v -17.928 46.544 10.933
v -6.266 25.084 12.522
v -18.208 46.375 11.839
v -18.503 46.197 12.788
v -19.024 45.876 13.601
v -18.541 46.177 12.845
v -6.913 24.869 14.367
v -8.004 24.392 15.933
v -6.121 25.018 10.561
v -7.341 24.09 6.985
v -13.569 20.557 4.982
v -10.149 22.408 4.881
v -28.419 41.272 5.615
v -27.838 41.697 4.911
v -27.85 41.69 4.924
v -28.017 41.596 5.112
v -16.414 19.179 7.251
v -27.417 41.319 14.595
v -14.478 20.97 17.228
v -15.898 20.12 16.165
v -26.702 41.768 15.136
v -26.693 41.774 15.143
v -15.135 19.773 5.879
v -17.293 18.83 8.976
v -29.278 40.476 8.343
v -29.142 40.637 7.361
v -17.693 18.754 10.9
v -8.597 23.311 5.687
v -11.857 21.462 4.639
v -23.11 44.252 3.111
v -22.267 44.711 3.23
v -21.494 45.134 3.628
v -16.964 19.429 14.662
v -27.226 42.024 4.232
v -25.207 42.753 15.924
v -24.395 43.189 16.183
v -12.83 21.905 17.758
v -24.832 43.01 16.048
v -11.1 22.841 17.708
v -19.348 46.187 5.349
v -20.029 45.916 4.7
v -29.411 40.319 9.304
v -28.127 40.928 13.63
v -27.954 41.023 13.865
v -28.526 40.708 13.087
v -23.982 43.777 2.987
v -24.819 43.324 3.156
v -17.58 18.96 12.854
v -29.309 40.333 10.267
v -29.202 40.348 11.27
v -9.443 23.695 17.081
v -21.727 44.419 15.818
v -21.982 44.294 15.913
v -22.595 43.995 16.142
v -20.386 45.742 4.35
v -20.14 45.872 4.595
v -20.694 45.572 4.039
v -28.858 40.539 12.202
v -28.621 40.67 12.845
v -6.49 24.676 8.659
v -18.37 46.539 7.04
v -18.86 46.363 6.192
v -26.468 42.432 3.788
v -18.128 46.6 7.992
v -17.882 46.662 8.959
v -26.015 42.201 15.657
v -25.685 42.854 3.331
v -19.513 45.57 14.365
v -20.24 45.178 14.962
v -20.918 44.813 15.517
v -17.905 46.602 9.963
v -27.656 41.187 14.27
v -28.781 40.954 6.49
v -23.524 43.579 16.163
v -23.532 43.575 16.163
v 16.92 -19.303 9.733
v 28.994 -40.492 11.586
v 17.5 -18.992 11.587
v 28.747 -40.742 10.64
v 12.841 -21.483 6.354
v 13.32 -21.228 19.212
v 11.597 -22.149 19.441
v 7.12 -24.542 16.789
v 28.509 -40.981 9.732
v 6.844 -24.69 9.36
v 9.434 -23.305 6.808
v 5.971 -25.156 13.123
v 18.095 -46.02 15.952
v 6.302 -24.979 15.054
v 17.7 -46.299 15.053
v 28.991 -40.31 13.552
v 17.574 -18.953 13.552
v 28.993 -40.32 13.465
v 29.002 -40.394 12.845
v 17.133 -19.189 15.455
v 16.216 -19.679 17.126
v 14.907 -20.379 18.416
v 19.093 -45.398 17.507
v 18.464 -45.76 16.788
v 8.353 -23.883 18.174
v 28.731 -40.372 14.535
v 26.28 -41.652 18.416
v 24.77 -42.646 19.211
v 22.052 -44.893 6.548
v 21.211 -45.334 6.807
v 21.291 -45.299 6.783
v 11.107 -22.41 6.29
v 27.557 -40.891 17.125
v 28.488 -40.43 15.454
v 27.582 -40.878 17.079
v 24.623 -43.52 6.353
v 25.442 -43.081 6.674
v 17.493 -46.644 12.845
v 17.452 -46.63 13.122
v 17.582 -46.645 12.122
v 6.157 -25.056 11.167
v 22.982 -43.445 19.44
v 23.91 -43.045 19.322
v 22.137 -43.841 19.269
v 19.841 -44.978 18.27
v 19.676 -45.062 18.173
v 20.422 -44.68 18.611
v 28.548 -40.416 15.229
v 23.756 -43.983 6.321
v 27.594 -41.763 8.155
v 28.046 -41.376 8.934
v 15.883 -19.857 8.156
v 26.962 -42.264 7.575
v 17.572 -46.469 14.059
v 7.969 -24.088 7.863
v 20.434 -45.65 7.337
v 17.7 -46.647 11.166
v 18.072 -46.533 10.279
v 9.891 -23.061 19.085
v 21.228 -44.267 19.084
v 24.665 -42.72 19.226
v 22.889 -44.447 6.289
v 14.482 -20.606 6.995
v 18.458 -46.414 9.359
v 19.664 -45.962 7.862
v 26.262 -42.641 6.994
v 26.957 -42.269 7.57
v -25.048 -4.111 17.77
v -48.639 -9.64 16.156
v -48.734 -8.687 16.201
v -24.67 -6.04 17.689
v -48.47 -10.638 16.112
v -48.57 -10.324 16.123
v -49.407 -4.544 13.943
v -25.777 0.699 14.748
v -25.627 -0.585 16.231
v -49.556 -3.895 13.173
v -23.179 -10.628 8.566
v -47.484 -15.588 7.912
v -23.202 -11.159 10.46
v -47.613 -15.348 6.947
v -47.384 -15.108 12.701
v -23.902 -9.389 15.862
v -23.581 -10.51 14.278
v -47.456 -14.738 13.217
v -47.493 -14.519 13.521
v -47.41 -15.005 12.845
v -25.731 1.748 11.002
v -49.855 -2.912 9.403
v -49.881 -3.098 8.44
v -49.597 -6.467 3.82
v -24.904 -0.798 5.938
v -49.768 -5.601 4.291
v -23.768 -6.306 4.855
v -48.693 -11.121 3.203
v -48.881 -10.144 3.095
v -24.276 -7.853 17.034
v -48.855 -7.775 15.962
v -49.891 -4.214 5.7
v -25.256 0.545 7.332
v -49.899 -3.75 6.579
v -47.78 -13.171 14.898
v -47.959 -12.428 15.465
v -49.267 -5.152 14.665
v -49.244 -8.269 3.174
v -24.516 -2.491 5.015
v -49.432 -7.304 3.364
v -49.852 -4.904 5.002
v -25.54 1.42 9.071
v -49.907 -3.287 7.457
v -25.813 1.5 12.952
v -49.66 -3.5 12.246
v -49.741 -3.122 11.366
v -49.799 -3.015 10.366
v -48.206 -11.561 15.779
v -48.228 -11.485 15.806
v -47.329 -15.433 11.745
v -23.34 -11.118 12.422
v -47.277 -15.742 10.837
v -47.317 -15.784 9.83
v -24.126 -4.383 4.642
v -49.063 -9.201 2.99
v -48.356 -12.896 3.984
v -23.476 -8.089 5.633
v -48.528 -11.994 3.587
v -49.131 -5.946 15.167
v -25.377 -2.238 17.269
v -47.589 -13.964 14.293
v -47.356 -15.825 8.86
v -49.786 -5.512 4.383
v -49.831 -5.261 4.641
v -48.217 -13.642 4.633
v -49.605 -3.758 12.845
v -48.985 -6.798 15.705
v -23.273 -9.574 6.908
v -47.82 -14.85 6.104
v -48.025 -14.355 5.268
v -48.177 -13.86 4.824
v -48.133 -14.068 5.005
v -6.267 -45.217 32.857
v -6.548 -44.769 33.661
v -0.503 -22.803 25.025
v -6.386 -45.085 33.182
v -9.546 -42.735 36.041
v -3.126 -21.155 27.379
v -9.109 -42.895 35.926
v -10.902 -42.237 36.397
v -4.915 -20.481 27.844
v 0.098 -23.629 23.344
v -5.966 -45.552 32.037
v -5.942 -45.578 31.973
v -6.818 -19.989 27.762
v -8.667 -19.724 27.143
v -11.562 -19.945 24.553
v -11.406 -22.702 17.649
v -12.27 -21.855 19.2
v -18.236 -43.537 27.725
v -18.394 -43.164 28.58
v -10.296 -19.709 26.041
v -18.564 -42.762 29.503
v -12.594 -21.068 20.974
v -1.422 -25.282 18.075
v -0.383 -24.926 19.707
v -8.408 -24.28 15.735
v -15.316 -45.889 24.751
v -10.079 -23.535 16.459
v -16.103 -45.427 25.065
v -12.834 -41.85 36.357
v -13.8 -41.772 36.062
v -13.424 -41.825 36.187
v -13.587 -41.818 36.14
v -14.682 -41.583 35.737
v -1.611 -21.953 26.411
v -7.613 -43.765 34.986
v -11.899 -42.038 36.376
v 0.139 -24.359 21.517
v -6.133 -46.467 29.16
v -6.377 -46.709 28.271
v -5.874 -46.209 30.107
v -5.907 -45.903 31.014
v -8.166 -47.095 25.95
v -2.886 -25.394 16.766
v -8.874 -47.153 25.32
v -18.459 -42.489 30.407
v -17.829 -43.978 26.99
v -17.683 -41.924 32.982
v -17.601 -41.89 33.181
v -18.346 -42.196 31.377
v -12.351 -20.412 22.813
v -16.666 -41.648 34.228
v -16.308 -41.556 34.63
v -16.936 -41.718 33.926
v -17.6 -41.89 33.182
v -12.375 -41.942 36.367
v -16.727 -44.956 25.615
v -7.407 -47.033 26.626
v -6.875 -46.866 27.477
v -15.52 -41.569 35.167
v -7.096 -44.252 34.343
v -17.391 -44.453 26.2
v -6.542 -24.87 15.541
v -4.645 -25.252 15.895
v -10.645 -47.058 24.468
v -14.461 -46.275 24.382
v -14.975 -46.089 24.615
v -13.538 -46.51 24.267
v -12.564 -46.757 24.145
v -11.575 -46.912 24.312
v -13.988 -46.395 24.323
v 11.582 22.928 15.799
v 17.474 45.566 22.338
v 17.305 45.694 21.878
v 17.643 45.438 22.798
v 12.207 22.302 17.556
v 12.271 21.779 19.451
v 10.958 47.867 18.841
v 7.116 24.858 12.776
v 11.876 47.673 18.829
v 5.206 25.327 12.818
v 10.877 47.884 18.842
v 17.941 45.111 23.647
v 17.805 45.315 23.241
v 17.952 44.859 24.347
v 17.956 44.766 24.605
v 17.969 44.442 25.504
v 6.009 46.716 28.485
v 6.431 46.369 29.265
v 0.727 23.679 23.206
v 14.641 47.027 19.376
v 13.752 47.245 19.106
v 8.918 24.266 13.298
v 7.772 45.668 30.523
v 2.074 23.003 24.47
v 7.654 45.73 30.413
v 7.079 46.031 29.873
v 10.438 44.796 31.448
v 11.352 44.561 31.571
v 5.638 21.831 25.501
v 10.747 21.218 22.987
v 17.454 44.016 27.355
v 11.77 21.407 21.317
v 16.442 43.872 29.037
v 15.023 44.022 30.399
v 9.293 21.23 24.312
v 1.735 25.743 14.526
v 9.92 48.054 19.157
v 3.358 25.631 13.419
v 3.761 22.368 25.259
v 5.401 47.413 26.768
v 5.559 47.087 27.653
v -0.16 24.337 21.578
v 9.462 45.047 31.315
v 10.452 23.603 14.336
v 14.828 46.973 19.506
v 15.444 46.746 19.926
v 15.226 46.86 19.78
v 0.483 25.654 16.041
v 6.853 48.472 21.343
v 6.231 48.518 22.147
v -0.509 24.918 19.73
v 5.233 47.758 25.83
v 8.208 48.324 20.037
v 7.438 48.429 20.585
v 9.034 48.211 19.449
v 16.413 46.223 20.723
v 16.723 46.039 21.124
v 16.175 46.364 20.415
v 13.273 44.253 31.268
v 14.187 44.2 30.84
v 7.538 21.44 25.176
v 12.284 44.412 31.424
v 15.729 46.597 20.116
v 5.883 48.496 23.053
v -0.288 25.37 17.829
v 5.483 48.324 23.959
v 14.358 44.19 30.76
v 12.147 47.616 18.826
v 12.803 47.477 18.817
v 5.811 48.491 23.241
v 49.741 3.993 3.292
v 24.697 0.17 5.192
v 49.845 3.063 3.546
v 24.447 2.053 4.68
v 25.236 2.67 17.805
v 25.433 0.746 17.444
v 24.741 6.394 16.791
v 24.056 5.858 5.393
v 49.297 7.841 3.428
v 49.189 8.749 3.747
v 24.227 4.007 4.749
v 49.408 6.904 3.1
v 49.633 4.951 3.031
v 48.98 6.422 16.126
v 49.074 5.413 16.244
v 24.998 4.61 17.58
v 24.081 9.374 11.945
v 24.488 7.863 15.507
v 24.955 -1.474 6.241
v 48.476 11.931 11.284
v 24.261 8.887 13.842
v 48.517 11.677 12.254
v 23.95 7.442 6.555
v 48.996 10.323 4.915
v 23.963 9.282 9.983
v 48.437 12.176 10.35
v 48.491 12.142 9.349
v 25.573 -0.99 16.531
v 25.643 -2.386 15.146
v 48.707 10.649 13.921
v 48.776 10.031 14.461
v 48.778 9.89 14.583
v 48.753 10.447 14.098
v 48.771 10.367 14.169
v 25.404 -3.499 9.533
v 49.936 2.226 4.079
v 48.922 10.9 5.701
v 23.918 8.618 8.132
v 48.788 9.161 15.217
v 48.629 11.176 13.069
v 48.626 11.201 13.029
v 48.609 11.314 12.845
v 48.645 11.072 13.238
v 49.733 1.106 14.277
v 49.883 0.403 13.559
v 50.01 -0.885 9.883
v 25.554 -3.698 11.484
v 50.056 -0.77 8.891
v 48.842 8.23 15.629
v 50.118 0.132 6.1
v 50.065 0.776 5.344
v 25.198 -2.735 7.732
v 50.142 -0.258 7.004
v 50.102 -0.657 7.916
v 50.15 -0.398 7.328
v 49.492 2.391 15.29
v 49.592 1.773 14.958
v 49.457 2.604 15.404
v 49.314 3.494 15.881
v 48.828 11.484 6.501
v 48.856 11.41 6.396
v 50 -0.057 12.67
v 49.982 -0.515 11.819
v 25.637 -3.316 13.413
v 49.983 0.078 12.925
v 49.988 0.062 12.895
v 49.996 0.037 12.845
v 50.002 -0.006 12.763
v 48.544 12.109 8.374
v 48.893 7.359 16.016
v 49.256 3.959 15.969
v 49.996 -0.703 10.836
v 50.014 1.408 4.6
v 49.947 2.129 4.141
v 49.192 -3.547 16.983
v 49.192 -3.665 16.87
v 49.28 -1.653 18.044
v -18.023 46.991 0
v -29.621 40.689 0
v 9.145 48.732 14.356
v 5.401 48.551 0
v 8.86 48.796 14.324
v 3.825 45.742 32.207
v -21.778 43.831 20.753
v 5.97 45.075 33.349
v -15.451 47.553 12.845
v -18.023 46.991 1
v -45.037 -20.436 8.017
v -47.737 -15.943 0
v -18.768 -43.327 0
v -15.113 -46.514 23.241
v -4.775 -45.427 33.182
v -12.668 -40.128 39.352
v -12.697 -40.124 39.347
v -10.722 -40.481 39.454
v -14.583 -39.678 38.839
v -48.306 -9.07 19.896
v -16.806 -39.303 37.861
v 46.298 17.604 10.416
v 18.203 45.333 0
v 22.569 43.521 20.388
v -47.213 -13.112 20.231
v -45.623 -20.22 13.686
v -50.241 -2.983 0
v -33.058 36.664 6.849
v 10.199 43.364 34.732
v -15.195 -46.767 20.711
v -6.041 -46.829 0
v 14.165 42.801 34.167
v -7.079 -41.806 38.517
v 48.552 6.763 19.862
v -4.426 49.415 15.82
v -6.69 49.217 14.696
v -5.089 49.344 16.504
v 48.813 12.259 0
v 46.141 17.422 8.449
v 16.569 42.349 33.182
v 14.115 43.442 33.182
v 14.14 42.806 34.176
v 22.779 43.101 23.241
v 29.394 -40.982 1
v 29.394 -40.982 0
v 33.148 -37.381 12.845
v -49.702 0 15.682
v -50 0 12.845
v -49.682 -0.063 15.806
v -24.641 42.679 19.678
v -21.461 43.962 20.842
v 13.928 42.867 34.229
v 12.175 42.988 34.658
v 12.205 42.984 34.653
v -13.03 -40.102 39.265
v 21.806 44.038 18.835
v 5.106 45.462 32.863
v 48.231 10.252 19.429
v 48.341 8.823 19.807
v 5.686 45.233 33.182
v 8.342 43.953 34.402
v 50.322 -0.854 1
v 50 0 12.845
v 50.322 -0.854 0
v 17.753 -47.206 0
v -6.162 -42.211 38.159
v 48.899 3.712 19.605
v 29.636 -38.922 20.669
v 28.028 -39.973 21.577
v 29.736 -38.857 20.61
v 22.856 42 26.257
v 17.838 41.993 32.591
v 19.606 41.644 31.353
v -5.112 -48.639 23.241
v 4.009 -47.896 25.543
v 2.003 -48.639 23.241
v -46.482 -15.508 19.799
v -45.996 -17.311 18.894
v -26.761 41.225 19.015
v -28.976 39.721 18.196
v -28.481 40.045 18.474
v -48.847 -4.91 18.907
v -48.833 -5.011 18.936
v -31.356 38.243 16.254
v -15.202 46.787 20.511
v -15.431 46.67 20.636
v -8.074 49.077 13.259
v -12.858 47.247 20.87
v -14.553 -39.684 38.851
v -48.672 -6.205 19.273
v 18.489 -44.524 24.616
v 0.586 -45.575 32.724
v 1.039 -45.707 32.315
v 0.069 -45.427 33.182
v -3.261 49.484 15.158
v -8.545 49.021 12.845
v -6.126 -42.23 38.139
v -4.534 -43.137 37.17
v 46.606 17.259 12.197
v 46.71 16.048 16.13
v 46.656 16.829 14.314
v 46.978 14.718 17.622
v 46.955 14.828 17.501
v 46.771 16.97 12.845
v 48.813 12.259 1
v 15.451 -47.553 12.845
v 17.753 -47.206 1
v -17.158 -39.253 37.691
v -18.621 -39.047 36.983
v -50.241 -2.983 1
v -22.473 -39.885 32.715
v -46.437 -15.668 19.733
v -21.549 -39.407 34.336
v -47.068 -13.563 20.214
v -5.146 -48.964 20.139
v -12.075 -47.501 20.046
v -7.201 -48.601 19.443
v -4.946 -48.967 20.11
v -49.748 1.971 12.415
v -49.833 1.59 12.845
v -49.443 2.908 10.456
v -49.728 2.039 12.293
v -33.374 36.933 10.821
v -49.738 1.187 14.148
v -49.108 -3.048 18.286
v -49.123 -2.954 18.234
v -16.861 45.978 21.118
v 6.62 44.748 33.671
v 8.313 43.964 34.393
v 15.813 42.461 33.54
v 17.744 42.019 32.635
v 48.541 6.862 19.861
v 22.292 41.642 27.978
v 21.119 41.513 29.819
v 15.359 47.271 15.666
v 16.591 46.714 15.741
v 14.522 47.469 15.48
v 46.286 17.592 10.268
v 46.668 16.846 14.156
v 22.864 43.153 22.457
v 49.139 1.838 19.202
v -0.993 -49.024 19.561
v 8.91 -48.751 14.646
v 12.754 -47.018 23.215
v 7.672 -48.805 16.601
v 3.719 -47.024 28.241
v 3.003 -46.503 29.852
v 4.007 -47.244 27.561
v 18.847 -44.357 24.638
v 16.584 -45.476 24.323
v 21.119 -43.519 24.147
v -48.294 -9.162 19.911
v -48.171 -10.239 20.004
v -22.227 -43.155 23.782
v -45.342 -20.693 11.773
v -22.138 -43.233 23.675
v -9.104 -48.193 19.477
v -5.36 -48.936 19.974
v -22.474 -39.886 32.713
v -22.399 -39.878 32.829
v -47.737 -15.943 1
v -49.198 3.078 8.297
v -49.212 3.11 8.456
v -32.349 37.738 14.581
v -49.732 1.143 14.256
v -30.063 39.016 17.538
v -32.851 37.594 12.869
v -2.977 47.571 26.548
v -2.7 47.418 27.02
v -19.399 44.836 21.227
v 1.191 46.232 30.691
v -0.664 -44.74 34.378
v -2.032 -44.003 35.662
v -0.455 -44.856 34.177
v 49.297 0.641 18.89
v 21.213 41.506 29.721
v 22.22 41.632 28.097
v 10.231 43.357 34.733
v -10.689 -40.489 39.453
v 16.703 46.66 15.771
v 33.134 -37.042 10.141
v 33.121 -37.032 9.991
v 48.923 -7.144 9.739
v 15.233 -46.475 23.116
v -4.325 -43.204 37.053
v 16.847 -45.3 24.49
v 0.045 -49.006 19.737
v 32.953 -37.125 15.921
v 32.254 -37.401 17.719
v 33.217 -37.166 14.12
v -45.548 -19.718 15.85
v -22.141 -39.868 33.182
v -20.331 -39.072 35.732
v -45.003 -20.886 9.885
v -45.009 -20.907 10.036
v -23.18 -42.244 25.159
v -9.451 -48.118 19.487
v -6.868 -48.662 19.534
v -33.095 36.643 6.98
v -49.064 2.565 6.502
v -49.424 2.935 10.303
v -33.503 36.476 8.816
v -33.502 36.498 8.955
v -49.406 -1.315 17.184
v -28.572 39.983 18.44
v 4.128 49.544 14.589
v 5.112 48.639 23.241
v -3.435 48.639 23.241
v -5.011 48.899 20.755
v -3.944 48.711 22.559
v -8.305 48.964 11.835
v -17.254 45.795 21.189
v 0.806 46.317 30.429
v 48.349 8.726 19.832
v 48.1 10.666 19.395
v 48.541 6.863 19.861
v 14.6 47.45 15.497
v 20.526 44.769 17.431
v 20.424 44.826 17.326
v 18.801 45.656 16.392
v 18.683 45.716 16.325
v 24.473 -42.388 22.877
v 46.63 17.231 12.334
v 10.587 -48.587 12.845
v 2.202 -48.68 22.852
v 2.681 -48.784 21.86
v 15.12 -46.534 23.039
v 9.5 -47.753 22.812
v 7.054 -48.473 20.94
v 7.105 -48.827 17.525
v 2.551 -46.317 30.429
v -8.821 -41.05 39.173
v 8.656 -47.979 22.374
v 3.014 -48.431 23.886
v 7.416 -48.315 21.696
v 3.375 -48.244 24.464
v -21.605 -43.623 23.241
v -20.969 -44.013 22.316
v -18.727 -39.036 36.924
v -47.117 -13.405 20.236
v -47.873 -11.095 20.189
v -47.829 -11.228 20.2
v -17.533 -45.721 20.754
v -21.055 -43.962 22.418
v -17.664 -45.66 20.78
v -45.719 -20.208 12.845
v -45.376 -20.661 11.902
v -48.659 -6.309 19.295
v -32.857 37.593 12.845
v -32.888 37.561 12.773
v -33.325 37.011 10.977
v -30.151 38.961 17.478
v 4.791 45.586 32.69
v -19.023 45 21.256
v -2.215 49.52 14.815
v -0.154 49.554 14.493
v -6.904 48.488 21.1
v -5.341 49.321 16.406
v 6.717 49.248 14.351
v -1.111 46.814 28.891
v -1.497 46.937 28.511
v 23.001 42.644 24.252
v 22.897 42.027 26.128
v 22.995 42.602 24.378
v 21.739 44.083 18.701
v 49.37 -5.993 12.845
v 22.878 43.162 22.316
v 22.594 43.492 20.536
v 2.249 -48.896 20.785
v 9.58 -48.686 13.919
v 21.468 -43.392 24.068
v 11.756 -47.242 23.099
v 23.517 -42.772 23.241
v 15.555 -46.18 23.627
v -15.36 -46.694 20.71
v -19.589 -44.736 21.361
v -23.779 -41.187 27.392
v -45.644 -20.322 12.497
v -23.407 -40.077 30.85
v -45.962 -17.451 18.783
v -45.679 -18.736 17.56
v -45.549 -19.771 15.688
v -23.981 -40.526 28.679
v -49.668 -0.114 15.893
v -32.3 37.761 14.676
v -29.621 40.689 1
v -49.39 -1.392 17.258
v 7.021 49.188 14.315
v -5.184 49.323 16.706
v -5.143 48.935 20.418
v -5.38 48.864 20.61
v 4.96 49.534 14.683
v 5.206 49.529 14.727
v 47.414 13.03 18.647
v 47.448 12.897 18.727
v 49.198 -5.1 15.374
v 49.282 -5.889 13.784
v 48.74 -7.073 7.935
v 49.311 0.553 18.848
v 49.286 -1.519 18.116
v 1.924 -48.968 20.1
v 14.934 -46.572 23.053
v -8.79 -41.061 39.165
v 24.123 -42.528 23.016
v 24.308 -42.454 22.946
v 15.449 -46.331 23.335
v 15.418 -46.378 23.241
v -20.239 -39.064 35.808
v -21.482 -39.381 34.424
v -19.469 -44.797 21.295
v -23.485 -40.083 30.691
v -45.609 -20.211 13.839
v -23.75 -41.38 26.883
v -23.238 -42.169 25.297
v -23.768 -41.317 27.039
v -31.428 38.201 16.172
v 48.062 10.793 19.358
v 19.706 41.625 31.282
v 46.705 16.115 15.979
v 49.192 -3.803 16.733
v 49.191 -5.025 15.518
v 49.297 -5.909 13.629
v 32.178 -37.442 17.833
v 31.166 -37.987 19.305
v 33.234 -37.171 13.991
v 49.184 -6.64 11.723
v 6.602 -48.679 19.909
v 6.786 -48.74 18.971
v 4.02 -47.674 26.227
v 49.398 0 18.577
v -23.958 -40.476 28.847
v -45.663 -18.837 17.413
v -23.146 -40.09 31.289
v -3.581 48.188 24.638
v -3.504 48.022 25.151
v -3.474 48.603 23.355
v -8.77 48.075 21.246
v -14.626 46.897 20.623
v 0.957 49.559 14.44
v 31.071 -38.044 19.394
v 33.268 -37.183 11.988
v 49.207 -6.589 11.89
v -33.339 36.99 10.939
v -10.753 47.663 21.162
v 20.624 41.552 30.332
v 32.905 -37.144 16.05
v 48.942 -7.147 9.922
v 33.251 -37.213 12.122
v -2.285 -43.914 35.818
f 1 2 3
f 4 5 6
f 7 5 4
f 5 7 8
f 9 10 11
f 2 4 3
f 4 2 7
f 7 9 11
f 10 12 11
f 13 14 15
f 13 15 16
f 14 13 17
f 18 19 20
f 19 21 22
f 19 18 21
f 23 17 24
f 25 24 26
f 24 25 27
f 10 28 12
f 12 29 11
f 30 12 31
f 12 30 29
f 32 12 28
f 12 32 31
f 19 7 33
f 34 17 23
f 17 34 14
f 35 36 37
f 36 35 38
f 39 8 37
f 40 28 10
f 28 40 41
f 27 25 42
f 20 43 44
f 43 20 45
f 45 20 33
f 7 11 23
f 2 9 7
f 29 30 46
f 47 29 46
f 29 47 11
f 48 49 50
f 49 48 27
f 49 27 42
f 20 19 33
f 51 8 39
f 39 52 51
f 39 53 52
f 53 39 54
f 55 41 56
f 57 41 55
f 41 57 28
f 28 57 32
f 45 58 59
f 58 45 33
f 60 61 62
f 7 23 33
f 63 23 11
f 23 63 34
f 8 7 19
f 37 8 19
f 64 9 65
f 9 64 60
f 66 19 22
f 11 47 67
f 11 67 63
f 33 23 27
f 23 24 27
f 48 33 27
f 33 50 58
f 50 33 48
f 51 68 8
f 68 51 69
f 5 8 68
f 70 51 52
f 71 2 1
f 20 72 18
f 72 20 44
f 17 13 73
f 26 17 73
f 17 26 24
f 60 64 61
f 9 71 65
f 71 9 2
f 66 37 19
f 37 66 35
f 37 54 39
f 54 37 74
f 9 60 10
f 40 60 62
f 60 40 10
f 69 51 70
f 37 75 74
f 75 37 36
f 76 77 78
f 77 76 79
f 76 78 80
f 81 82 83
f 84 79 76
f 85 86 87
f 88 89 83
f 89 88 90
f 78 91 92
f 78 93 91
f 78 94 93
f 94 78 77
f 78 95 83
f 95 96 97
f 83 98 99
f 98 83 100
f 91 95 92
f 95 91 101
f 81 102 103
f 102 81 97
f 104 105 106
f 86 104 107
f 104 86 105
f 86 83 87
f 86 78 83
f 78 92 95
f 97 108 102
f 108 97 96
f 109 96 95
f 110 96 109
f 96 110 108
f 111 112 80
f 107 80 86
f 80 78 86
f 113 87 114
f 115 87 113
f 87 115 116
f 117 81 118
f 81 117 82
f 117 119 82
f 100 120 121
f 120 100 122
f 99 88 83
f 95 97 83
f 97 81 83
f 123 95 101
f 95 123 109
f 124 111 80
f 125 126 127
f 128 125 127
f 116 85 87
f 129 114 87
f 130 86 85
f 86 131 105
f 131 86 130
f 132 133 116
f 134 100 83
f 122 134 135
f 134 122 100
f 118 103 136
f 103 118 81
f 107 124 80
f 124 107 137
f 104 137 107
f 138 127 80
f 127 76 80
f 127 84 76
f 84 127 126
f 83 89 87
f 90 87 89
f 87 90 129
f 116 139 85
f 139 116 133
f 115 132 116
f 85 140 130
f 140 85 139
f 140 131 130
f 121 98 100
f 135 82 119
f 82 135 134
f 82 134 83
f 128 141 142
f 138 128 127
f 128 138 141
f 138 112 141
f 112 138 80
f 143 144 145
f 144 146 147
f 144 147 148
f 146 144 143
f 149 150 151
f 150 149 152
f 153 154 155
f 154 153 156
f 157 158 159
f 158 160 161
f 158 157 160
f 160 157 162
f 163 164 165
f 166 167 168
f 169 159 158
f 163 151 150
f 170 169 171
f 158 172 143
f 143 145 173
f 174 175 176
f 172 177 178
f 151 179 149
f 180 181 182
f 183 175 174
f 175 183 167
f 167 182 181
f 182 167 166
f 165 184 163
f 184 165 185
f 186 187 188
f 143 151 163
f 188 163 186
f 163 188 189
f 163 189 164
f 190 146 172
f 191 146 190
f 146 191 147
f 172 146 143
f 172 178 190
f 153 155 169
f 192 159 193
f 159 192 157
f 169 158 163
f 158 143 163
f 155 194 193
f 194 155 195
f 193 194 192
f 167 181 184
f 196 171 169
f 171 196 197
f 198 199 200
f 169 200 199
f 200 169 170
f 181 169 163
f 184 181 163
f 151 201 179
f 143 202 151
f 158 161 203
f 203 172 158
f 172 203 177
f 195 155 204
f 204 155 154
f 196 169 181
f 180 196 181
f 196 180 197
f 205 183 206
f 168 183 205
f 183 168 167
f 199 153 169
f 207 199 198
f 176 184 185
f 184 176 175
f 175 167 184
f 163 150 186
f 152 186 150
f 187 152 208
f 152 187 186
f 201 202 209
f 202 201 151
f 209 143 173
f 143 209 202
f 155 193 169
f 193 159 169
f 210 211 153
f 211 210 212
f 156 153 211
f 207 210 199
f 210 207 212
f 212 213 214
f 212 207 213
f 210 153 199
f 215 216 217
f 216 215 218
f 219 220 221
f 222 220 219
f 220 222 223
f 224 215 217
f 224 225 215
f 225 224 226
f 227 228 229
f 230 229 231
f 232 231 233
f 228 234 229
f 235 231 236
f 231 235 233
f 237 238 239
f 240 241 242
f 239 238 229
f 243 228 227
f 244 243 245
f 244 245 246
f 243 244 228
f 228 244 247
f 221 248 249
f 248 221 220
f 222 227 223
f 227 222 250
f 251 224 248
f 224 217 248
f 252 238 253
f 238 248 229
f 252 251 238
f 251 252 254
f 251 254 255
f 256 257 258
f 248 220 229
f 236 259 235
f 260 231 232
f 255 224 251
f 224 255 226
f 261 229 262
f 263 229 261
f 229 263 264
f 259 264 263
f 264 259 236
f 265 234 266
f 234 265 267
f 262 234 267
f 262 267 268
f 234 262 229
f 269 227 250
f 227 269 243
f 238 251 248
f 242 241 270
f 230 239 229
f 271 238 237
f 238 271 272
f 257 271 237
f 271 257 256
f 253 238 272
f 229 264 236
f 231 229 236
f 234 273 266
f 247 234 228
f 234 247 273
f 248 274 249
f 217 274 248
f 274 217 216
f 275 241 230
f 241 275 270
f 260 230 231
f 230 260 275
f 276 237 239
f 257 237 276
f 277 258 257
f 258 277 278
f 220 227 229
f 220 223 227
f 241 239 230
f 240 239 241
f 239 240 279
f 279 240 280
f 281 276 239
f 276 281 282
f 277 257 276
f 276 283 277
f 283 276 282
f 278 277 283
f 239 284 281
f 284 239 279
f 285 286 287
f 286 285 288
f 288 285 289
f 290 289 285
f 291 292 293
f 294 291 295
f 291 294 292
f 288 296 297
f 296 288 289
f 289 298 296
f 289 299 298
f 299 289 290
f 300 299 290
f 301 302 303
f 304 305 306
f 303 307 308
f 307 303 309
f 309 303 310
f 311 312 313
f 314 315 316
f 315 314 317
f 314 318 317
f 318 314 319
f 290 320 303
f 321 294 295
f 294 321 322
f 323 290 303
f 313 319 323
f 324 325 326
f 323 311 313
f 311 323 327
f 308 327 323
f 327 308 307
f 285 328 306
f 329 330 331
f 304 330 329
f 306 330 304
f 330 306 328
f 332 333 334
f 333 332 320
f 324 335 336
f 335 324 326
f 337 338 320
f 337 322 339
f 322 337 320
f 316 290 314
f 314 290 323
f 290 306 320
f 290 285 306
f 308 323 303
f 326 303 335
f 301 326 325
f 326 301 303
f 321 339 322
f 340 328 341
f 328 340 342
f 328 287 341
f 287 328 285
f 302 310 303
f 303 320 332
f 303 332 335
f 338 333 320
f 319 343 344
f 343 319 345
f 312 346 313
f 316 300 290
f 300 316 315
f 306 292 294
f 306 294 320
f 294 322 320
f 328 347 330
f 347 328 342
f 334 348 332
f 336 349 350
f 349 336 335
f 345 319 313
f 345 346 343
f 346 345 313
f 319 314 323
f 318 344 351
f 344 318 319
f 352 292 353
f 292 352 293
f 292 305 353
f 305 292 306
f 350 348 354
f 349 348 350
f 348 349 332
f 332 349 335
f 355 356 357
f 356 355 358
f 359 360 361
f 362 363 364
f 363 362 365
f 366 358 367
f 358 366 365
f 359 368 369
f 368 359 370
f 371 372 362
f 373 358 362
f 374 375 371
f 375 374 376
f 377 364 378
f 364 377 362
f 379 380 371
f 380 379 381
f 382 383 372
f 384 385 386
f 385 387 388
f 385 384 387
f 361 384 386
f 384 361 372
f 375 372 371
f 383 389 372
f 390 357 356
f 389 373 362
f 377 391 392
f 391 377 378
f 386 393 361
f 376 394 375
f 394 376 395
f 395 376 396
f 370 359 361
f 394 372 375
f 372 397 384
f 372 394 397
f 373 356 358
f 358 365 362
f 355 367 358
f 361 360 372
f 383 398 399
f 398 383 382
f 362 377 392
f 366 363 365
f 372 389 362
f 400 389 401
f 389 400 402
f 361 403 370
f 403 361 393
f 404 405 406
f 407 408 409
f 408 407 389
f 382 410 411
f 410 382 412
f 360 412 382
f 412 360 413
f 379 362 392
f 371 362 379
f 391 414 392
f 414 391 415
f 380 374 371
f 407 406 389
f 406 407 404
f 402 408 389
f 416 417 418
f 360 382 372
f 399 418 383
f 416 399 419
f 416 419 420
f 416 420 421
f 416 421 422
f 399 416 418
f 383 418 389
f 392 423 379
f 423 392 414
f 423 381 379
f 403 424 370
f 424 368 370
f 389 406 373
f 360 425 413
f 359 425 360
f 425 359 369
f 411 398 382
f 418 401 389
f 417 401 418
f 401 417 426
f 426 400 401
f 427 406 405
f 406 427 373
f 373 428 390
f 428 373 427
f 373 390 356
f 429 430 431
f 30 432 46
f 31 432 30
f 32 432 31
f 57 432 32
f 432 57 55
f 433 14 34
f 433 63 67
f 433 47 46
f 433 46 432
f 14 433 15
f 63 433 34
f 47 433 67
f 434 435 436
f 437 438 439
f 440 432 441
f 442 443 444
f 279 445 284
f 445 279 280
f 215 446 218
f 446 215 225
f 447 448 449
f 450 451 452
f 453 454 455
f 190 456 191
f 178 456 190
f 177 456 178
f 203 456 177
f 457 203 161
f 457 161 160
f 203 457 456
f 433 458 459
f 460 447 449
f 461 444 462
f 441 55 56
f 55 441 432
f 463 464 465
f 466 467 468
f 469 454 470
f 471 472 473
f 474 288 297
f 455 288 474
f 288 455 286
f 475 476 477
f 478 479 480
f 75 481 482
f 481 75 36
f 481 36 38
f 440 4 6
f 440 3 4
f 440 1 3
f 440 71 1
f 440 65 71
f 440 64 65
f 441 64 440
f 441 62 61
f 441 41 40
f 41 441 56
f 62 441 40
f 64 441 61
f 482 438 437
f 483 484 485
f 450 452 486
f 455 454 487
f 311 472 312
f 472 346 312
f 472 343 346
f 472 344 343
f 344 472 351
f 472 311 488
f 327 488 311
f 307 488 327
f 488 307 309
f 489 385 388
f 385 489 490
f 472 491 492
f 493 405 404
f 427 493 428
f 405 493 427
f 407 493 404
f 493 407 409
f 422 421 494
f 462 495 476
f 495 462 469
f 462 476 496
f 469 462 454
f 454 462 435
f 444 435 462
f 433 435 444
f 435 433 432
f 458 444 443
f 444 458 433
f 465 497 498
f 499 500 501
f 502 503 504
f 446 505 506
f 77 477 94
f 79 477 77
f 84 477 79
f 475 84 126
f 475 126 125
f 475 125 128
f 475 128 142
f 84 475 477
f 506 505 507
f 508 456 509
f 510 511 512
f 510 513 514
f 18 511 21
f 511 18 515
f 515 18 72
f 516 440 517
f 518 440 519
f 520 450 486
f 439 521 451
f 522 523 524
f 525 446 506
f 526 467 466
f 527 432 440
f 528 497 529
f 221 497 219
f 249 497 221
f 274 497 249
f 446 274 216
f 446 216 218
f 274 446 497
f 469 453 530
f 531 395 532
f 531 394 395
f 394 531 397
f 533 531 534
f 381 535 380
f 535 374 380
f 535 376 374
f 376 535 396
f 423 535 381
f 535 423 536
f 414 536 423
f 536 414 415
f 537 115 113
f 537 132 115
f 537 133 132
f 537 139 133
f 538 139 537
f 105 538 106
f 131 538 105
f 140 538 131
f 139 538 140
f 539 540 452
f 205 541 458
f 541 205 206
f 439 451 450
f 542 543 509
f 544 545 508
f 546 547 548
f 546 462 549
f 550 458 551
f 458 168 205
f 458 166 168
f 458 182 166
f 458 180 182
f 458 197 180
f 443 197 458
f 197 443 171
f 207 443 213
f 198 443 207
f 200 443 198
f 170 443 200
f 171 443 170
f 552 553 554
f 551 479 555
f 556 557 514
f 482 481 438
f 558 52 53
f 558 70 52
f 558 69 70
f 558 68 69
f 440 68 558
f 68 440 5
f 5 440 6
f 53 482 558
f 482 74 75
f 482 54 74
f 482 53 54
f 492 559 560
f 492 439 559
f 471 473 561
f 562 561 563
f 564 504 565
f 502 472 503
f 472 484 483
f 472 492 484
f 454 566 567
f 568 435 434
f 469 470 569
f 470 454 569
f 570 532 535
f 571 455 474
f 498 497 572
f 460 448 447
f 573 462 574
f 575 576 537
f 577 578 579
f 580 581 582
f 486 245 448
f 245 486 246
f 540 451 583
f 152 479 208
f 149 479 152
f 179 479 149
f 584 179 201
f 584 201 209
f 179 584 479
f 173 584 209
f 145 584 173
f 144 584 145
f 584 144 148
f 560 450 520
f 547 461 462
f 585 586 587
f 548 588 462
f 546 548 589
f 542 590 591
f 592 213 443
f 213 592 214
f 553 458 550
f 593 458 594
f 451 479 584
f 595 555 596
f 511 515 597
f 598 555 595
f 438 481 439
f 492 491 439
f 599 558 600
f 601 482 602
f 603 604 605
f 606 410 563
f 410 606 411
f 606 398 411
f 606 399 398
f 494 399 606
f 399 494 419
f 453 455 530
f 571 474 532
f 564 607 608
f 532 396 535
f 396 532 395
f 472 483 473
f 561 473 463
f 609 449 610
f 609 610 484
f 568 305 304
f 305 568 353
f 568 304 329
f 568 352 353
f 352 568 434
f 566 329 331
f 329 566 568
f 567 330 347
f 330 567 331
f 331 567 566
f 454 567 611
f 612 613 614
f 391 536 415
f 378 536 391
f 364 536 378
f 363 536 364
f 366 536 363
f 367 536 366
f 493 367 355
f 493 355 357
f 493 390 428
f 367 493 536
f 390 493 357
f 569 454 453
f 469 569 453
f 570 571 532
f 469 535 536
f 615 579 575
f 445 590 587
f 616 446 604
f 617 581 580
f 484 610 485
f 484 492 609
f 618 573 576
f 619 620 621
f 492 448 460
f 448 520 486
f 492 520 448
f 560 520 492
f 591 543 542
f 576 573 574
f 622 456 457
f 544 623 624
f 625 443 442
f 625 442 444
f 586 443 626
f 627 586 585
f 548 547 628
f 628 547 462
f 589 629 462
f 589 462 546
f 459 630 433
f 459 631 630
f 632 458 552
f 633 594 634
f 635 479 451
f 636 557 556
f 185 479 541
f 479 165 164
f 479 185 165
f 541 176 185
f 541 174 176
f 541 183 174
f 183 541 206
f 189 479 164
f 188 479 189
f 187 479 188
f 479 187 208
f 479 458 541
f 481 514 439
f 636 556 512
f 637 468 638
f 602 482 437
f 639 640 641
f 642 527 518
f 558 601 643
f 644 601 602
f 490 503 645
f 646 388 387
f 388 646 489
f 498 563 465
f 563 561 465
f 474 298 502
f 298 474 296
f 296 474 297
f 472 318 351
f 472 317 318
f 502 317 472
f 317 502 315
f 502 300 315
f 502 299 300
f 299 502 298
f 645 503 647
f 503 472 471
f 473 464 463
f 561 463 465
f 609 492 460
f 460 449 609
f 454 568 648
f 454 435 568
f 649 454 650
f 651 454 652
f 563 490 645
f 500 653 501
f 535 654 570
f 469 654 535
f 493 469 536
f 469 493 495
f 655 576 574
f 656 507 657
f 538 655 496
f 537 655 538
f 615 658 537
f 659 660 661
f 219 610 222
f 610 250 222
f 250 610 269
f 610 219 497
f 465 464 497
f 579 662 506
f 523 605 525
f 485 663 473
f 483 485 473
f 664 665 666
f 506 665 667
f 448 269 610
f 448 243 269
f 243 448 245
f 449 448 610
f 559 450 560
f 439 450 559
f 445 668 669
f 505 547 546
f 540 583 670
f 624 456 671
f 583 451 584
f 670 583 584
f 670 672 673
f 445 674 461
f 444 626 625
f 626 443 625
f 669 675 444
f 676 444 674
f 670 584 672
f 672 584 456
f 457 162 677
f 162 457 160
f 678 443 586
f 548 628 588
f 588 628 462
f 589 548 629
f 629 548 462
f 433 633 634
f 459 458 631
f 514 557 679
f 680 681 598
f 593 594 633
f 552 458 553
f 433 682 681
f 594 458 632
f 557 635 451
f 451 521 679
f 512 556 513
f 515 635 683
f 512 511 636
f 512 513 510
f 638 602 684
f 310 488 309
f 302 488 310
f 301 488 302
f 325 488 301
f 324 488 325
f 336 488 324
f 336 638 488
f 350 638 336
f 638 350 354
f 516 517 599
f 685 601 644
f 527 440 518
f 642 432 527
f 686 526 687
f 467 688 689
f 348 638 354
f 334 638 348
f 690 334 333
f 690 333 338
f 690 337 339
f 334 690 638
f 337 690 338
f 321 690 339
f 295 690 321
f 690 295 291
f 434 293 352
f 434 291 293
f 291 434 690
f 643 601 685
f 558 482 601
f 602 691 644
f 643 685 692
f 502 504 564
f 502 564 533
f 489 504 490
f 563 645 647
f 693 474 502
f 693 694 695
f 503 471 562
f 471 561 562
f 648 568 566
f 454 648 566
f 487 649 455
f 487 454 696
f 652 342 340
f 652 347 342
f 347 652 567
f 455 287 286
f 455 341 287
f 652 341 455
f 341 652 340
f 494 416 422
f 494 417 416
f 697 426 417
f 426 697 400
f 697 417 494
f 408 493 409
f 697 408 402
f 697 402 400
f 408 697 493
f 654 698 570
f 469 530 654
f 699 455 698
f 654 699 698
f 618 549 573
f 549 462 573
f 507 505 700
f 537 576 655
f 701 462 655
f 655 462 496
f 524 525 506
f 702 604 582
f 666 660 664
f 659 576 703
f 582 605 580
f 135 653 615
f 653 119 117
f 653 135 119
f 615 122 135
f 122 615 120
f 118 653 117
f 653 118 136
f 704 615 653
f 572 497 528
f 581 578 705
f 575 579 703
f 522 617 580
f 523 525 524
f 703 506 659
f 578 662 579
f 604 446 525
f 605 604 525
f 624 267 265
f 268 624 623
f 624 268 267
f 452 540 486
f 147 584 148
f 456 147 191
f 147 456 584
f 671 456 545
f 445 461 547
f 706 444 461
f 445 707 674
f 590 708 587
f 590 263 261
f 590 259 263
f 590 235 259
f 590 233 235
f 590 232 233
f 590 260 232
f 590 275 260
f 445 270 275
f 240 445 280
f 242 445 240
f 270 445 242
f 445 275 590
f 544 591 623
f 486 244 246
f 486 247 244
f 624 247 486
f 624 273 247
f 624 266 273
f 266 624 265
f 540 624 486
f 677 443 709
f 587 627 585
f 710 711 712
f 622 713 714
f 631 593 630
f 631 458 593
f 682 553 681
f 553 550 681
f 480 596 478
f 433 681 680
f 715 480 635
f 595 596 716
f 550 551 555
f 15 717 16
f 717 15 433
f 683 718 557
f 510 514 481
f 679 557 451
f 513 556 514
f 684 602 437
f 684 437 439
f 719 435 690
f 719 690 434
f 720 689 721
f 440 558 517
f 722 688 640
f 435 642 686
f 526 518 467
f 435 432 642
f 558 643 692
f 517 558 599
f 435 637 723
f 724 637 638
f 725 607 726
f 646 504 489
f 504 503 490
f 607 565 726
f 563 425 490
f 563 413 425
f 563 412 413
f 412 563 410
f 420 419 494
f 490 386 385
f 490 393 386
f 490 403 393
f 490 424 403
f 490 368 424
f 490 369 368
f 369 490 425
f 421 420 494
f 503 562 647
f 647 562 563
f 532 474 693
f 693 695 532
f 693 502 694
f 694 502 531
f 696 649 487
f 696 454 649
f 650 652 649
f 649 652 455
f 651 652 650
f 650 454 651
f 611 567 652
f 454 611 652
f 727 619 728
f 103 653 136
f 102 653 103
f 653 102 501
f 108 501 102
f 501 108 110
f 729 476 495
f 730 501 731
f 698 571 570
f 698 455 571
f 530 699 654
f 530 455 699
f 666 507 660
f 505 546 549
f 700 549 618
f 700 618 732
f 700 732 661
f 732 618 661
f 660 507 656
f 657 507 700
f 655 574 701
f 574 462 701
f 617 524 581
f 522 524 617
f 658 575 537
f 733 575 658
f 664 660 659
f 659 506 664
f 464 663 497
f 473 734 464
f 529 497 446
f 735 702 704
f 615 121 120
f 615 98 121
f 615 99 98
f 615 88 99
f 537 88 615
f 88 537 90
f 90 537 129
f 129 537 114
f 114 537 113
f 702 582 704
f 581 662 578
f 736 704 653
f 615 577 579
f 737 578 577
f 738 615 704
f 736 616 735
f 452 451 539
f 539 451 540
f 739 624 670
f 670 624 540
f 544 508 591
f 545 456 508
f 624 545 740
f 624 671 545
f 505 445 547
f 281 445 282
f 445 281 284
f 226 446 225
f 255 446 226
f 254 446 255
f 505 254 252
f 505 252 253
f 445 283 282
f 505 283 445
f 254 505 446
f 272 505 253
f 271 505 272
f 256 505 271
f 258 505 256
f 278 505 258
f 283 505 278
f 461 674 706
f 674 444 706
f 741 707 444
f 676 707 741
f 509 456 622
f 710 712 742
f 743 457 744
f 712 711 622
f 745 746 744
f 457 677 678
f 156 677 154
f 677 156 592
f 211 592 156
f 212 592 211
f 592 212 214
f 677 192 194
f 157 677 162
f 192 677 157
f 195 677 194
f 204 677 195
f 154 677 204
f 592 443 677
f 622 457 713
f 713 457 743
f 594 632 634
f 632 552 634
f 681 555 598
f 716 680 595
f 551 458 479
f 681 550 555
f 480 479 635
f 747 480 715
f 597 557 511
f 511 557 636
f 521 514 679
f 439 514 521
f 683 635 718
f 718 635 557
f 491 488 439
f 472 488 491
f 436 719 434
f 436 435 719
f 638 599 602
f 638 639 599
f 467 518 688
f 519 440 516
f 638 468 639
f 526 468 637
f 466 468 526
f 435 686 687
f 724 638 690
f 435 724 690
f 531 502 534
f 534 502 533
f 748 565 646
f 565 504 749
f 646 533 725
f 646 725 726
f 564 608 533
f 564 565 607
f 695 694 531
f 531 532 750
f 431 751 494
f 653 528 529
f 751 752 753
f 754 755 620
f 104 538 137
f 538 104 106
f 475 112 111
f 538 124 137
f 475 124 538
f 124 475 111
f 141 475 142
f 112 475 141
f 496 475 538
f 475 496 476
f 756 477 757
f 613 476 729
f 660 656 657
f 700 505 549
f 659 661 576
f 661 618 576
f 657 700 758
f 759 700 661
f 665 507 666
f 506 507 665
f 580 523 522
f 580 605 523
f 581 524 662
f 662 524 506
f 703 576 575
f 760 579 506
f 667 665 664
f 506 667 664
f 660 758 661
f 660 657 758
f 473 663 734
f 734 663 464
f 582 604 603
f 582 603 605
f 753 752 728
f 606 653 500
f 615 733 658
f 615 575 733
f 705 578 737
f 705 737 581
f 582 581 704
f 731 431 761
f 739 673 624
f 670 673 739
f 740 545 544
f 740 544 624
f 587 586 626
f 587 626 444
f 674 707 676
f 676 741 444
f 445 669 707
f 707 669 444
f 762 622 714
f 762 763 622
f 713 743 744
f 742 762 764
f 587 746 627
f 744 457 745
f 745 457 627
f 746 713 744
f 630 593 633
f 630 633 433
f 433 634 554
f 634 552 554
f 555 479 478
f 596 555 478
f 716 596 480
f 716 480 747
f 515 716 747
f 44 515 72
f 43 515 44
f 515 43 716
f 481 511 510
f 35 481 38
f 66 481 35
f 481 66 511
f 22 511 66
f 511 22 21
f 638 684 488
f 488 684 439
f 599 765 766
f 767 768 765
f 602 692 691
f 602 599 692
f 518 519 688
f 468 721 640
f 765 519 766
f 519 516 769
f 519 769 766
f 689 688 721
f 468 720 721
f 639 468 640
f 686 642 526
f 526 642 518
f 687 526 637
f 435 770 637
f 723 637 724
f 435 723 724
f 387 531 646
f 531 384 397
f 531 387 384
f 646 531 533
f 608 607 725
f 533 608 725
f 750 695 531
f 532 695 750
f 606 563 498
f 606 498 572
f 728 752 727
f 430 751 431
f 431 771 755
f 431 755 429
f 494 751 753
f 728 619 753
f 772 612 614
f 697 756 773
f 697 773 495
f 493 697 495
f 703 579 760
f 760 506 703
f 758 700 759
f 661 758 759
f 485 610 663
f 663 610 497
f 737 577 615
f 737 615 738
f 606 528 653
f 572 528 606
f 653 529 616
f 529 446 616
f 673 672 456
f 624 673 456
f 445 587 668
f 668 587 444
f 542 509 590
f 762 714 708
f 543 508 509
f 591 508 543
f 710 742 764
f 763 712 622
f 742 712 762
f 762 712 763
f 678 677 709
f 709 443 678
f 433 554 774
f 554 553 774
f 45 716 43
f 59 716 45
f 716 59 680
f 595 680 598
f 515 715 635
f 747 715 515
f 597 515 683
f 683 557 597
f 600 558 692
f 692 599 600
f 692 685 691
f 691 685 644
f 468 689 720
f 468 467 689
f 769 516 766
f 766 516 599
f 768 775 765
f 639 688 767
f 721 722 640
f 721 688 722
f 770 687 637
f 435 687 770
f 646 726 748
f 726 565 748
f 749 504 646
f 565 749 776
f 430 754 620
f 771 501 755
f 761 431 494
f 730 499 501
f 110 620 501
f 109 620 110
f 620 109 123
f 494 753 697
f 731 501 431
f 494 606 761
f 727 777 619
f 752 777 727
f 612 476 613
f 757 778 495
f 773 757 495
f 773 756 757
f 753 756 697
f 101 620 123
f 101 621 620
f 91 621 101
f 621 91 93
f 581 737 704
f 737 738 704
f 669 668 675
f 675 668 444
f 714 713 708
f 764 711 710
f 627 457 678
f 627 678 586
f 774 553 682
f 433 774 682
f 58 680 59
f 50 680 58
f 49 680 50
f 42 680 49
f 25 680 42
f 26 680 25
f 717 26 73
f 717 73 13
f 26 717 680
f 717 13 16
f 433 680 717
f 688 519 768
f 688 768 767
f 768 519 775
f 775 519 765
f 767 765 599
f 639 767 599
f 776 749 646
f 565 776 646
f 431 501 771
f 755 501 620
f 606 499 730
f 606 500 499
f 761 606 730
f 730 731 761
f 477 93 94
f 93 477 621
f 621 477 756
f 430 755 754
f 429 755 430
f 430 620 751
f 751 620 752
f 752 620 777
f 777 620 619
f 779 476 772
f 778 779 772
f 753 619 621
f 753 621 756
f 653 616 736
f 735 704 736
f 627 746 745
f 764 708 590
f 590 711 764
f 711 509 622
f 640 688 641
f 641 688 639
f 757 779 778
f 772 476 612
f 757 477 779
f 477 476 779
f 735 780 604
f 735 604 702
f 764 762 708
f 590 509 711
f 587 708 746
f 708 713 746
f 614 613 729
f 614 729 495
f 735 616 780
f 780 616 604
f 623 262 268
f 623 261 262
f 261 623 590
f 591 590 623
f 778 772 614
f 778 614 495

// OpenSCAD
difference() {
	hull() {
		union() {
			union() {
				rotate(a = 118.5190809644, v = [0, 0, 1]) {
					translate(v = [0, -6.6000000000, 0]) {
						cube(size = [49.8945602892, 13.2000000000, 1]);
					}
				}
				rotate(a = -61.8702837395, v = [0, 0, 1]) {
					translate(v = [0, -6.6000000000, 0]) {
						cube(size = [49.9999999791, 13.2000000000, 1]);
					}
				}
				rotate(a = -169.0667888368, v = [0, 0, 1]) {
					translate(v = [0, -6.6000000000, 0]) {
						cube(size = [49.8945597788, 13.2000000000, 1]);
					}
				}
				rotate(a = -105.3856022510, v = [0, 0, 1]) {
					translate(v = [0, -6.6000000000, 0]) {
						cube(size = [46.7539184115, 13.2000000000, 1]);
					}
				}
				rotate(a = 75.8877702221, v = [0, 0, 1]) {
					translate(v = [0, -6.6000000000, 0]) {
						cube(size = [48.4029110626, 13.2000000000, 1]);
					}
				}
				rotate(a = 6.5627499058, v = [0, 0, 1]) {
					translate(v = [0, -6.6000000000, 0]) {
						cube(size = [49.8945605185, 13.2000000000, 1]);
					}
				}
			}
			translate(v = [0, 0, 12.8454177866]) {
				intersection() {
					hull() {
						rotate(a = 93.7215889021, v = [-0.8768053135, -0.4764444908, 0.0000013532]) {
							cylinder(h = 50, r = 9.6000000000);
						}
						rotate(a = 90.0016795434, v = [0.8818824583, 0.4714693298, -0.0000013534]) {
							cylinder(h = 50, r = 9.6000000000);
						}
						rotate(a = 93.7216880234, v = [0.1892645674, -0.9797783474, 0.0000007905]) {
							cylinder(h = 50, r = 9.6000000000);
						}
						rotate(a = 69.2408800157, v = [0.9015674822, -0.2480895902, -0.0000006535]) {
							cylinder(h = 50, r = 9.6000000000);
						}
						rotate(a = 75.4794823209, v = [-0.9388419672, 0.2360336654, 0.0000007028]) {
							cylinder(h = 50, r = 9.6000000000);
						}
						rotate(a = 93.7215443727, v = [-0.1140503467, 0.9913523741, -0.0000008773]) {
							cylinder(h = 50, r = 9.6000000000);
						}
					}
					sphere(r = 50);
				}
			}
		}
	}
	translate(v = [0, 0, 12.8454177866]) {
		rotate(a = 93.7215889021, v = [-0.8768053135, -0.4764444908, 0.0000013532]) {
			translate(v = [0, 0, 25]) {
				cylinder(h = 50, r = 6.6000000000);
			}
		}
		rotate(a = 90.0016795434, v = [0.8818824583, 0.4714693298, -0.0000013534]) {
			translate(v = [0, 0, 25]) {
				cylinder(h = 50, r = 6.6000000000);
			}
		}
		rotate(a = 93.7216880234, v = [0.1892645674, -0.9797783474, 0.0000007905]) {
			translate(v = [0, 0, 25]) {
				cylinder(h = 50, r = 6.6000000000);
			}
		}
		rotate(a = 69.2408800157, v = [0.9015674822, -0.2480895902, -0.0000006535]) {
			translate(v = [0, 0, 25]) {
				cylinder(h = 50, r = 6.6000000000);
			}
		}
		rotate(a = 75.4794823209, v = [-0.9388419672, 0.2360336654, 0.0000007028]) {
			translate(v = [0, 0, 25]) {
				cylinder(h = 50, r = 6.6000000000);
			}
		}
		rotate(a = 93.7215443727, v = [-0.1140503467, 0.9913523741, -0.0000008773]) {
			translate(v = [0, 0, 25]) {
				cylinder(h = 50, r = 6.6000000000);
			}
		}
	}
}
